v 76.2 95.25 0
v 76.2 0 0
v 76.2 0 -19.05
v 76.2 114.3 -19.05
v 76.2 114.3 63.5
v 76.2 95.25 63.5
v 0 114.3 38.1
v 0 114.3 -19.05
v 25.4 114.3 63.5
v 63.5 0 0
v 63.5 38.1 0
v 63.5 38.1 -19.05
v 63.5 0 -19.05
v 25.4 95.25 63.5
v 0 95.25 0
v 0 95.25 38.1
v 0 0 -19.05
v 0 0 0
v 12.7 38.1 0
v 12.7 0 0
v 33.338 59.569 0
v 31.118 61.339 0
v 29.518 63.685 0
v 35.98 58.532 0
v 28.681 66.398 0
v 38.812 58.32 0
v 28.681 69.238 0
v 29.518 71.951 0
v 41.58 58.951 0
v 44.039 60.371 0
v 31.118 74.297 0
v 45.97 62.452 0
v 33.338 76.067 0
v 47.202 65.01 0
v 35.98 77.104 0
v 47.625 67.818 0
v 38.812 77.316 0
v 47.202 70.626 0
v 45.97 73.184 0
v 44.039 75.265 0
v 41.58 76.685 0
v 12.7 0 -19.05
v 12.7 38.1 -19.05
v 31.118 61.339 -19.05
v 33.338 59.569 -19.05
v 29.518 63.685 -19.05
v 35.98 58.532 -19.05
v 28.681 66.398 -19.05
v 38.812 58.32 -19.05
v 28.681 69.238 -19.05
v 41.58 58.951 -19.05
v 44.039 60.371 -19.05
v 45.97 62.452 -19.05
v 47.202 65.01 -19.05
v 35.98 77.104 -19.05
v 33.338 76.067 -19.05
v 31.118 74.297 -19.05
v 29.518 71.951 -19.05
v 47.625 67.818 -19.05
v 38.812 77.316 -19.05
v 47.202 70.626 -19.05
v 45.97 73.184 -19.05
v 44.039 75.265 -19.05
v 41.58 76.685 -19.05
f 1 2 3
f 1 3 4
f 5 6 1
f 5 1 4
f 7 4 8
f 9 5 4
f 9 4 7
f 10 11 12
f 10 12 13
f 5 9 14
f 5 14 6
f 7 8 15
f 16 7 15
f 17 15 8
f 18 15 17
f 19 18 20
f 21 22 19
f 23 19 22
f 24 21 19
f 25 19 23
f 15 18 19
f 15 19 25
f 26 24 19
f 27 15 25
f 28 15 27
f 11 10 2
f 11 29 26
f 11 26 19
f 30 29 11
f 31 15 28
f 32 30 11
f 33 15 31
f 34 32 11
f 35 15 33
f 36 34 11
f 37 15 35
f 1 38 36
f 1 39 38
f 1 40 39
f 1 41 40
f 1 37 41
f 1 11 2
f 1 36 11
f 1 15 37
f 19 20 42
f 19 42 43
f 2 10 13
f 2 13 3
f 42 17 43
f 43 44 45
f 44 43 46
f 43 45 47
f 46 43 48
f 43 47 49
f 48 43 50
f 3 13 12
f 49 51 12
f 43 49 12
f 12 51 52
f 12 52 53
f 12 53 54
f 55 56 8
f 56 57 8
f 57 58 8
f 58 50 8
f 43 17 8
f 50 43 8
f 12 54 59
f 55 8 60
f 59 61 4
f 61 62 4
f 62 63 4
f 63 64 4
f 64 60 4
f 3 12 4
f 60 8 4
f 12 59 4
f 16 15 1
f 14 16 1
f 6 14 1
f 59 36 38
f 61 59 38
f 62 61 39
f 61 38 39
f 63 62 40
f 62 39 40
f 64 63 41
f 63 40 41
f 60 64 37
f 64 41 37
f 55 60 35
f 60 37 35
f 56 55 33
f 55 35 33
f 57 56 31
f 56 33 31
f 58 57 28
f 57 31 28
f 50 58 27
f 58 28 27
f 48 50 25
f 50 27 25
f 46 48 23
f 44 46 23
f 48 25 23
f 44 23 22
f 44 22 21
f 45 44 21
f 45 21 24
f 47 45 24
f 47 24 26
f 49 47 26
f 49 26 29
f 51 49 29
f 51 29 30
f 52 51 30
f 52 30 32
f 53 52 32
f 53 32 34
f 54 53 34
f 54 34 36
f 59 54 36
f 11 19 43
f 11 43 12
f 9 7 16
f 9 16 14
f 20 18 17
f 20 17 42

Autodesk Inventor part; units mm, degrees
ref_plane "YZ Plane" through (0, 0, 0) normal (1, 0, 0) x (0, 1, 0)
ref_plane "XZ Plane" through (0, 0, 0) normal (0, 1, 0) x (-1, 0, 0)
ref_plane "XY Plane" through (0, 0, 0) normal (0, 0, 1) x (1, 0, 0)
sketch "Sketch1" plane through (0, 0, 0) normal (0, 0, 1) x (1, 0, 0)
  line L0 (0, 0) -> (12.7, 0)
  line L1 (12.7, 0) -> (12.7, 38.1)
  line L2 (12.7, 38.1) -> (63.5, 38.1)
  line L3 (63.5, 38.1) -> (63.5, 0)
  line L4 (63.5, 0) -> (76.2, 0)
  line L5 (76.2, 0) -> (76.2, 114.3)
  line L6 (76.2, 114.3) -> (0, 114.3)
  line L7 (0, 114.3) -> (0, 0)
  circle A0 centre (38.1, 67.818) radius 9.525
  dimension "d0" = 12.7
  dimension "d1" = 50.8
  dimension "d2" = 76.2
  dimension "d3" = 114.3
  dimension "d4" = 38.1
  dimension "d5" = 19.05
  dimension "d6" = 67.818
  dimension "d7" = 38.1
extrude "Extrusion1" add sketch "Sketch1" against normal blind 19.05
sketch "Sketch3" plane through (0, 114.3, 0) normal (0, 1, 0) x (1, 0, 0)
  line L0 (0, 0) -> (0, -38.1)
  line L1 (0, -38.1) -> (25.4, -63.5)
  line L2 (25.4, -63.5) -> (76.2, -63.5)
  line L3 (0, 0) -> (12.7, 0) projected
  line L4 (76.2, -63.5) -> (76.2, 0)
  line L5 (76.2, 0) -> (0, 0) projected
  dimension "d10" = 90
  dimension "d11" = 90
  dimension "d12" = 50.8
  dimension "d13" = 25.4
  dimension "d14" = 63.5
extrude "Extrusion2" add sketch "Sketch3" against normal blind 19.05
properties part number "HW 2 Part 6"
